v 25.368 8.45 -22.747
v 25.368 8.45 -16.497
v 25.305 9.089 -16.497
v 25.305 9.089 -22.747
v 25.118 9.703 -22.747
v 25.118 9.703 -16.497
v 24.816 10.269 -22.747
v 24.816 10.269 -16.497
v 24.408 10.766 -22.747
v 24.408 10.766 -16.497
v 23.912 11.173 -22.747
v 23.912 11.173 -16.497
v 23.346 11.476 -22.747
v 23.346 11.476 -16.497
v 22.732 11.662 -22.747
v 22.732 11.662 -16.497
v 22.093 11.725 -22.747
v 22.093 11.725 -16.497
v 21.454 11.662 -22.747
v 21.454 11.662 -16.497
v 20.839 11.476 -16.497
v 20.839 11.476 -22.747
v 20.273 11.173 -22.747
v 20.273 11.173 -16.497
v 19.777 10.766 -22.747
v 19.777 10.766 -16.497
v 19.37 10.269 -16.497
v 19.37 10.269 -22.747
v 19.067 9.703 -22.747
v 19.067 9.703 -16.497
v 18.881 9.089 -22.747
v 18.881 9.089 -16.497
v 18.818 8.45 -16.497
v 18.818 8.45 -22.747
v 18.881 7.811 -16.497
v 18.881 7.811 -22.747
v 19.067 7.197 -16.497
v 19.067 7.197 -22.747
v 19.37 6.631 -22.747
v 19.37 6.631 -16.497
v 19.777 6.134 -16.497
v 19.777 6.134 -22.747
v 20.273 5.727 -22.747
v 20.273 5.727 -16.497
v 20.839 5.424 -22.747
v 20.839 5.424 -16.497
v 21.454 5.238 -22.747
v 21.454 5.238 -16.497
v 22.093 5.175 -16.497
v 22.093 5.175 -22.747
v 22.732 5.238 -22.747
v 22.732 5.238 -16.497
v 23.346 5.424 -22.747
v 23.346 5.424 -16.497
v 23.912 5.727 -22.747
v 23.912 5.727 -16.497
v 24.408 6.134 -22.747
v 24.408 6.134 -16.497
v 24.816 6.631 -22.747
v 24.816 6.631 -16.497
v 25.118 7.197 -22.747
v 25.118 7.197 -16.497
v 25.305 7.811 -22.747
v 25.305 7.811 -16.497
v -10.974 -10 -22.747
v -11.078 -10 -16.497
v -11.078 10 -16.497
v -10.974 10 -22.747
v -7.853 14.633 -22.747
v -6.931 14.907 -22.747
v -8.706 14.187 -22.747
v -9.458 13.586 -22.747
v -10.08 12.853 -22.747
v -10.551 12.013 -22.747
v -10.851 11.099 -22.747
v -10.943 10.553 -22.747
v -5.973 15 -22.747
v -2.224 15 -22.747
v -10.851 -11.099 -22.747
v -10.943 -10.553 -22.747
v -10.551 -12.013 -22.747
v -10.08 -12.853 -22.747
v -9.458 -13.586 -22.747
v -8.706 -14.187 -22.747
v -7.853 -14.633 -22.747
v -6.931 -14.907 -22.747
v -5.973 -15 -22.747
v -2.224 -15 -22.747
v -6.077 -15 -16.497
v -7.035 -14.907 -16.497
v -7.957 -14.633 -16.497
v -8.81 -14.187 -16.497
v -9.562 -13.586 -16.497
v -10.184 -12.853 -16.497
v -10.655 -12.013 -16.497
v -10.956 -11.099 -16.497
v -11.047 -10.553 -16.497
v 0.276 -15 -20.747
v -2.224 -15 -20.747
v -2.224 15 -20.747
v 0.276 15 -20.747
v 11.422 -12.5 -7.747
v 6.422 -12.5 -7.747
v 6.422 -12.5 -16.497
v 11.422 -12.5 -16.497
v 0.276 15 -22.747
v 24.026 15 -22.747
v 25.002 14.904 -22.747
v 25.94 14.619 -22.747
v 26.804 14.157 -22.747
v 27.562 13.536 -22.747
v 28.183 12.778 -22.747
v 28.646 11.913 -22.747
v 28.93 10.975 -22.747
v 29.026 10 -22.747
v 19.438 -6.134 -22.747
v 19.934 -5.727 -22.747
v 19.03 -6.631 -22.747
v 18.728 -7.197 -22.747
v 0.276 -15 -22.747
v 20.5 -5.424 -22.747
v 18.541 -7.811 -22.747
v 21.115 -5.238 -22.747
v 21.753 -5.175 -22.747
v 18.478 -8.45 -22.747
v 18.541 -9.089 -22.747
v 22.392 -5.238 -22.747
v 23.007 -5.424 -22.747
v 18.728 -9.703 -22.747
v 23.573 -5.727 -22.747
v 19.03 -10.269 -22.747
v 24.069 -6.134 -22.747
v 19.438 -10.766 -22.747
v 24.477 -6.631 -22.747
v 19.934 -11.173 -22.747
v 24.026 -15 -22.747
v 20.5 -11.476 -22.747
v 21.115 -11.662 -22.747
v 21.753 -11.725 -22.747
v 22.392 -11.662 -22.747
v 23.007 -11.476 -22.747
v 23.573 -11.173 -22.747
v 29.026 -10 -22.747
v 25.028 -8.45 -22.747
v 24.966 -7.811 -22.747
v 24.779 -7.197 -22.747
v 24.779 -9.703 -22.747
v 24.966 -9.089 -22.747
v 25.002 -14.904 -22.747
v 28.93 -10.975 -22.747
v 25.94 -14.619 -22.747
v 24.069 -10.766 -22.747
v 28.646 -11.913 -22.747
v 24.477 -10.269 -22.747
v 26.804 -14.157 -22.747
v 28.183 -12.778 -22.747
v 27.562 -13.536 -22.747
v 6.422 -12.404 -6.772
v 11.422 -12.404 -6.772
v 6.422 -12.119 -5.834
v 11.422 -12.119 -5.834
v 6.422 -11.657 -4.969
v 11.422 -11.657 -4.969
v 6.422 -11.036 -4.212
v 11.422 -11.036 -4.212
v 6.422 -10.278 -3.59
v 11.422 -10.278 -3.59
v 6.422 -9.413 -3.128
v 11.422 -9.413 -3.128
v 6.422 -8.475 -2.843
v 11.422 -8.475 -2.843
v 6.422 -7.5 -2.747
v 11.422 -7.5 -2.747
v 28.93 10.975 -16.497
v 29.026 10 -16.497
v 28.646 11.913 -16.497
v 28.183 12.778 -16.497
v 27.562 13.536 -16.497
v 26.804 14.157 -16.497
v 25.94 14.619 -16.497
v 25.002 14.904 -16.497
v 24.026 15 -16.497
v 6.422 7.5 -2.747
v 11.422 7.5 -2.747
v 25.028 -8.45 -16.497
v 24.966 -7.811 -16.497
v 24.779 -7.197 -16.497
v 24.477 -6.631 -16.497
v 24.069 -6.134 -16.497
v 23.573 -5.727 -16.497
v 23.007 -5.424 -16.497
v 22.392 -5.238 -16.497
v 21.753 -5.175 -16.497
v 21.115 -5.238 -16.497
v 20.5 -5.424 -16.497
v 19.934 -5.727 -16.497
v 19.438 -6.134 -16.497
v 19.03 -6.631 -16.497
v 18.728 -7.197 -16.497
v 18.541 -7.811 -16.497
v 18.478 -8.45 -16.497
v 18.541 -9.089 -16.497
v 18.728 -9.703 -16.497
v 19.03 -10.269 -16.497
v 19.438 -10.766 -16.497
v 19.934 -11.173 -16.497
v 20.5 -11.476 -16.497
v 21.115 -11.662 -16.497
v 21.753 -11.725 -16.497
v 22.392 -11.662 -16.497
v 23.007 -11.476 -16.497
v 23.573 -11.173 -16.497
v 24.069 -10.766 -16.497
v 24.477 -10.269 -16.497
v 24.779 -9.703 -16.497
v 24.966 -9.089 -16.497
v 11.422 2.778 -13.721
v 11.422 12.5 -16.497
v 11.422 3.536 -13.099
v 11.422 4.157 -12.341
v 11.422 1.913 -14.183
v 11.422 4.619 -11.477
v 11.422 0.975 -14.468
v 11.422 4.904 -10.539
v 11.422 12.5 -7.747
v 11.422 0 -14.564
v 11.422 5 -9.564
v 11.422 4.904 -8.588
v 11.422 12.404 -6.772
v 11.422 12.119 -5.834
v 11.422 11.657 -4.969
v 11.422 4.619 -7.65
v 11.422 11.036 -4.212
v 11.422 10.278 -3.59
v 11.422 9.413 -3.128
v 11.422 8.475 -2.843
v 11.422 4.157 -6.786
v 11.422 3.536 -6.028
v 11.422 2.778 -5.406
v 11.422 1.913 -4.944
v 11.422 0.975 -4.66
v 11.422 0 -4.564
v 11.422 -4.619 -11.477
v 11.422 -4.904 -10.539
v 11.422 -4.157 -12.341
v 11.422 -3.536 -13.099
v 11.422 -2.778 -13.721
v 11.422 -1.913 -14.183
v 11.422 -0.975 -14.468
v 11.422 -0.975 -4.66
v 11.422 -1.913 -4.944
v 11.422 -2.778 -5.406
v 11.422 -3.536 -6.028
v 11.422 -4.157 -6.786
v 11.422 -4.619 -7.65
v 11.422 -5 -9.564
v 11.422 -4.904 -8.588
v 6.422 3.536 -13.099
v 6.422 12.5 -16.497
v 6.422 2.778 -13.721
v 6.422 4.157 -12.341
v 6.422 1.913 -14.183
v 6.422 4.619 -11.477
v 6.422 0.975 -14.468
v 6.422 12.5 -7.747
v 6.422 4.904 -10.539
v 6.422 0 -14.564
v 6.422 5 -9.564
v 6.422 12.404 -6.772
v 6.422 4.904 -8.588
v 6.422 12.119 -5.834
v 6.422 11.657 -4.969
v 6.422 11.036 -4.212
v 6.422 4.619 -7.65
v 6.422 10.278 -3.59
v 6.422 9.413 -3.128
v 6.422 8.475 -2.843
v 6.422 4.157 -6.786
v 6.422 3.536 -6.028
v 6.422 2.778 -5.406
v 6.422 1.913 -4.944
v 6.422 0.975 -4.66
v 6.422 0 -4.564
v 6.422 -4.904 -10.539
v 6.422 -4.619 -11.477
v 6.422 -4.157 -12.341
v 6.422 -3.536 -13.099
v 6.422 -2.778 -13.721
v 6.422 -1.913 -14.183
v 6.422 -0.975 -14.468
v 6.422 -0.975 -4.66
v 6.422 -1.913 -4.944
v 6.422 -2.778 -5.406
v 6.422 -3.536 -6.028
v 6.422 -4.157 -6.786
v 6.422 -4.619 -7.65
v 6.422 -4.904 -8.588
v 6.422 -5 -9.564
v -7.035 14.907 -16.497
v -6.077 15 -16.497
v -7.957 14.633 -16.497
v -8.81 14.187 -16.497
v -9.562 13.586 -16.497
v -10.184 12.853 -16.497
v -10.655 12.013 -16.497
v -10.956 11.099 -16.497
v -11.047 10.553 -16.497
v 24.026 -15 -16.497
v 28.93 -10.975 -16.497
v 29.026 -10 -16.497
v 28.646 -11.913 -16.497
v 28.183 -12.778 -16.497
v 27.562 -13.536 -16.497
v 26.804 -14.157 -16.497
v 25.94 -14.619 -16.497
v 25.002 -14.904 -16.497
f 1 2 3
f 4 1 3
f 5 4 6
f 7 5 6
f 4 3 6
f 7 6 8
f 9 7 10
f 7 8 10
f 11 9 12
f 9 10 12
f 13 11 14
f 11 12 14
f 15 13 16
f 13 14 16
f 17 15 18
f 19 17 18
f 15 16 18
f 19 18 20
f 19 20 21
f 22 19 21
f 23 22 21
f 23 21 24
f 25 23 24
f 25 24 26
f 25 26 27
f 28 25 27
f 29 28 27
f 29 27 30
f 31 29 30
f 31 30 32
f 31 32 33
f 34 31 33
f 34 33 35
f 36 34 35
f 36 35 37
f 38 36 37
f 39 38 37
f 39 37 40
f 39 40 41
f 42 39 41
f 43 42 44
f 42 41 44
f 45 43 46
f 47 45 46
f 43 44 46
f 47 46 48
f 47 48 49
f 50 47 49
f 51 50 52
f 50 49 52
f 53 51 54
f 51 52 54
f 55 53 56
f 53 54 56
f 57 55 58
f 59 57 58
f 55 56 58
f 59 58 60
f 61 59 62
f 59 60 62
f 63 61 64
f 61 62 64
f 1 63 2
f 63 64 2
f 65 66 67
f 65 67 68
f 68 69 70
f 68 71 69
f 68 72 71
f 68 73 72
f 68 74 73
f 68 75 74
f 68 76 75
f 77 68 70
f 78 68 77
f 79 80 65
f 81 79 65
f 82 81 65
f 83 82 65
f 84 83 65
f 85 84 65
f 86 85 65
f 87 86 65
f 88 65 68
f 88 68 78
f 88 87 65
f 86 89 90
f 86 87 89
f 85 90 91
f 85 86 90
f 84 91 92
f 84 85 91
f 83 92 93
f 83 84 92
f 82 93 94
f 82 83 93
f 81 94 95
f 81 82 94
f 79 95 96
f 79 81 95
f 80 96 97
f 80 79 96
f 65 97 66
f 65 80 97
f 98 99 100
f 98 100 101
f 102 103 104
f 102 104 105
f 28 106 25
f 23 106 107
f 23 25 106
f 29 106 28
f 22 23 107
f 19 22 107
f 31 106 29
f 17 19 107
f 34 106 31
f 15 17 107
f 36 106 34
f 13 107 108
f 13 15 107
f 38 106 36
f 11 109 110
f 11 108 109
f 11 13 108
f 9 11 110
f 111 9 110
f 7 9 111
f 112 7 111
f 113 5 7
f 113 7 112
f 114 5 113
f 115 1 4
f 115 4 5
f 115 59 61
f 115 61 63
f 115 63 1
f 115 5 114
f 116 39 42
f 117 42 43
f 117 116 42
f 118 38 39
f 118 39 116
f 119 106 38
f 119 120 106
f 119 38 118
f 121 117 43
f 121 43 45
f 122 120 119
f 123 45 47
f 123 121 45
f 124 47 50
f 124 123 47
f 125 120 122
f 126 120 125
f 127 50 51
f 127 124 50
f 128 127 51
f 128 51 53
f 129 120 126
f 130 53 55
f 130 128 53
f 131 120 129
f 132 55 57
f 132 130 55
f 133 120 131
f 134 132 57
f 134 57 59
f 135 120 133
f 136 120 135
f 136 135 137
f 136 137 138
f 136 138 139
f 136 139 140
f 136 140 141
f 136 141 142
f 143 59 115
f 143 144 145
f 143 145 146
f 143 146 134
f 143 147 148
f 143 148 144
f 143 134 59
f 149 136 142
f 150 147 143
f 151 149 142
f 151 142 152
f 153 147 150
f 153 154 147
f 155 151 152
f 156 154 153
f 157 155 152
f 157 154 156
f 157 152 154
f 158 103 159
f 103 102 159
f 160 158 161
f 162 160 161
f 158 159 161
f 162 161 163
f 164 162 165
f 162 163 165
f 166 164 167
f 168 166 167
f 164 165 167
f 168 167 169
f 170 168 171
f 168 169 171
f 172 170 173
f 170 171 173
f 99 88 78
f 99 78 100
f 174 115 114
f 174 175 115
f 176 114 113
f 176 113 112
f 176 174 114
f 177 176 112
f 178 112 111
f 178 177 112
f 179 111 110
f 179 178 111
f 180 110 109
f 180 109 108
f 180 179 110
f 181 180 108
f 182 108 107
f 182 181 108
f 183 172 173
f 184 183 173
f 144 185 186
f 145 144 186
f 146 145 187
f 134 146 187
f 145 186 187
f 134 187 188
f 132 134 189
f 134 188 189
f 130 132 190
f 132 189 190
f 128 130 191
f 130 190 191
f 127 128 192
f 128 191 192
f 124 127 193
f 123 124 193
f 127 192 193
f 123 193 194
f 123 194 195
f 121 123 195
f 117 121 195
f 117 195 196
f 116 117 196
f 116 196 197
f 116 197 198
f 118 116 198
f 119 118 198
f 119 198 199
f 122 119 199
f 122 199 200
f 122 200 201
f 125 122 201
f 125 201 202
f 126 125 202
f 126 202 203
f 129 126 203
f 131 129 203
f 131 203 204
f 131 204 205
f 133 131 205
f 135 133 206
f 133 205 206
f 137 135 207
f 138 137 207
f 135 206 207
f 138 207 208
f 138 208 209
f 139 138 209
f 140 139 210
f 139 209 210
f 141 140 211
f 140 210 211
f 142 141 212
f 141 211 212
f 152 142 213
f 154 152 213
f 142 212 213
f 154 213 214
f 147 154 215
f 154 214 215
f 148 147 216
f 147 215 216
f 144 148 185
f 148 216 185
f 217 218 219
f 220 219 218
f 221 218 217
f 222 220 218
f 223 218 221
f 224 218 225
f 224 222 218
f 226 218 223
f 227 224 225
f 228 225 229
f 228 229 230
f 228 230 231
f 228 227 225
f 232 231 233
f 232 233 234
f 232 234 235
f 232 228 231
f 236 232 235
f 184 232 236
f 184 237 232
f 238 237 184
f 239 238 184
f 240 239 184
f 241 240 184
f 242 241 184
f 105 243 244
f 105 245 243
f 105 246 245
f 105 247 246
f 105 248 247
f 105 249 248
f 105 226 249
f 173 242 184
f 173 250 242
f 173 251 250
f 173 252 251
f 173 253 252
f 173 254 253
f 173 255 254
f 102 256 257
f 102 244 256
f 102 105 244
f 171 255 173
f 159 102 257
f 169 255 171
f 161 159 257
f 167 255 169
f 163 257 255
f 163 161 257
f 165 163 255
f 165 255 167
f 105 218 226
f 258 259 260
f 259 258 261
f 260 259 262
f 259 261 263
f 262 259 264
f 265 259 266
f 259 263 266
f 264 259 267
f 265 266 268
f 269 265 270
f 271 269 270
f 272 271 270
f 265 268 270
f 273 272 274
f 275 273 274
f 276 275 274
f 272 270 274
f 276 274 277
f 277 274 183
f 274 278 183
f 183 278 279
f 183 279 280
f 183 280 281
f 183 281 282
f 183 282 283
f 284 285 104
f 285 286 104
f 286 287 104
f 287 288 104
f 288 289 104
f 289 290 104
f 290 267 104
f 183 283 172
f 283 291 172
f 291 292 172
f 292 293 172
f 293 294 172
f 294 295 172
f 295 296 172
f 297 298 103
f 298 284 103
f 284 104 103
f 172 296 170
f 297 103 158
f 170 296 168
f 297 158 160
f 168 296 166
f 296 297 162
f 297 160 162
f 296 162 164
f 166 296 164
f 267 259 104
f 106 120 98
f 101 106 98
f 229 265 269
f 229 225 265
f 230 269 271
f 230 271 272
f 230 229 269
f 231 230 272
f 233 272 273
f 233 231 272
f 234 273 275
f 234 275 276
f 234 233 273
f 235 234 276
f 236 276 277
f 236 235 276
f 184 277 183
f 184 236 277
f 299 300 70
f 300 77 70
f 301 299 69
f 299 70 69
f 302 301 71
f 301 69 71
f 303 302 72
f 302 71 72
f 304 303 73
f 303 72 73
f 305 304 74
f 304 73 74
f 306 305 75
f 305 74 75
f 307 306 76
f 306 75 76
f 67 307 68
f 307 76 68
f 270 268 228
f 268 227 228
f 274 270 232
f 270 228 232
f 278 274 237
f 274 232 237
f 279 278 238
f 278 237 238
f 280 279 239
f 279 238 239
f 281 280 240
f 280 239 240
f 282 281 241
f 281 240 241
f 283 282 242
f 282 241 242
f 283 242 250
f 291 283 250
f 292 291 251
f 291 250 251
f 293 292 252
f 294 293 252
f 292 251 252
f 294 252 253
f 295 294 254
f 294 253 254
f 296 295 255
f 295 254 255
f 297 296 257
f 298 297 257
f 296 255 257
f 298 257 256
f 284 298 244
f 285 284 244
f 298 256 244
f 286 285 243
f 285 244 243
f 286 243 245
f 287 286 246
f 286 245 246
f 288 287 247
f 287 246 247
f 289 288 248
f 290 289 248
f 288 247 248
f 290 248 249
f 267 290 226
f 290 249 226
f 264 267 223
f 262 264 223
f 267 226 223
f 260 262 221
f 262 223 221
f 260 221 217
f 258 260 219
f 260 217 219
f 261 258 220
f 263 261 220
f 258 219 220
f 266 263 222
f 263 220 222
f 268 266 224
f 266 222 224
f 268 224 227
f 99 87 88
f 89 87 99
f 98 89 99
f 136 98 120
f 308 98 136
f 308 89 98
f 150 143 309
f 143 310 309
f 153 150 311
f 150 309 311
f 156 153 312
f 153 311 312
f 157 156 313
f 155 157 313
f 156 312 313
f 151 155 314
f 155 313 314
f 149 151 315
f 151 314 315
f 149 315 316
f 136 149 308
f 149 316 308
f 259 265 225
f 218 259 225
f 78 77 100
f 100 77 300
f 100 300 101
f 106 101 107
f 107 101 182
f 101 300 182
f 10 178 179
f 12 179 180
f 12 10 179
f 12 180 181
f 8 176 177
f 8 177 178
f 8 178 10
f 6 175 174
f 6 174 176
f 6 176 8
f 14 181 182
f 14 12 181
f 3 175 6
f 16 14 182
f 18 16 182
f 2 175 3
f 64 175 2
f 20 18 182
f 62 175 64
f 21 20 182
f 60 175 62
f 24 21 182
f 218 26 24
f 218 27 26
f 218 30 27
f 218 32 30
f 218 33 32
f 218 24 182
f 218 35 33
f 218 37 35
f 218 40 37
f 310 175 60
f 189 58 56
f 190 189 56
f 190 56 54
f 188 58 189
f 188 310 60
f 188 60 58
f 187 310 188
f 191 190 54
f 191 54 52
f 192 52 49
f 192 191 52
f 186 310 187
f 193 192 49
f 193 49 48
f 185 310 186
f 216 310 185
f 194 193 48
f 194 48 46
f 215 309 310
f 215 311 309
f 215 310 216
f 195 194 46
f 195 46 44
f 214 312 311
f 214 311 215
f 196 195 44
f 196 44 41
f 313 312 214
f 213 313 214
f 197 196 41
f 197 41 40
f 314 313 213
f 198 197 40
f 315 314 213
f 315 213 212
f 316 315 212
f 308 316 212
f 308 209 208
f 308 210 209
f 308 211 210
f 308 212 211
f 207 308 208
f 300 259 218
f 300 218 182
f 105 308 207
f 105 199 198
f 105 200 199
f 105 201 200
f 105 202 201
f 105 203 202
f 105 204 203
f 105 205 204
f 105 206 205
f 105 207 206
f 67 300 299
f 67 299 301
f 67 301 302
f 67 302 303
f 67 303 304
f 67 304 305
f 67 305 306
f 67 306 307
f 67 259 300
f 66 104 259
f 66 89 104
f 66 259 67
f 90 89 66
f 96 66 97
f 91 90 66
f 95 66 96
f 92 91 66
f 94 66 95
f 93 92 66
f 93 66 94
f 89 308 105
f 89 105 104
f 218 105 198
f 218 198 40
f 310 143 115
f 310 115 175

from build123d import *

# Parameters (mm, degrees)
F1_DEPTH  = 15
F0_W      = 5
F0_H      = 13.750002
F2_DEPTH  = 12.5
F4_R      = 5
F5_R      = 5
F6_R      = 5
F7_R      = 3.275
F8_DEPTH  = 25
F3_W      = 2.5
F3_H      = 2
F9_DEPTH  = 50
F10_R     = 5
F11_DEPTH = 30


with BuildPart() as f1:
    # F0 (on Front) → F1 (new body, symmetric)
    with BuildSketch(Plane.XZ):
        Polygon((6.421984, -16.497303), (-11.078016, -16.497303), (-10.973849, -22.747303), (29.026151, -22.747303), (29.026151, -16.497303), (11.421984, -16.497303), align=None)
    extrude(amount=F1_DEPTH, both=True)

    # F0 (on Front) → F2 (join, symmetric)
    with BuildSketch(Plane.XZ):
        Polygon((6.421984, -16.497303), (-11.078016, -16.497303), (-10.973849, -22.747303), (29.026151, -22.747303), (29.026151, -16.497303), (11.421984, -16.497303), align=None)
        with Locations((8.921984, -9.622302)):
            Rectangle(F0_W, F0_H)
    extrude(amount=F2_DEPTH, both=True)

    # F4
    f4_edges = [f1.edges().sort_by_distance(p)[0] for p in [
        (29.026151, -15, -19.622303),
    ]]
    fillet(f4_edges, radius=F4_R)

    # F5
    f5_edges = [f1.edges().sort_by_distance(p)[0] for p in [
        (29.026151, 15, -19.622303),
        (-11.025932, -15, -19.622303),
        (-11.025932, 15, -19.622303),
    ]]
    fillet(f5_edges, radius=F5_R)

    # F6
    f6_edges = [f1.edges().sort_by_distance(p)[0] for p in [
        (8.921984, 12.5, -2.747301),
        (8.921984, -12.5, -2.747301),
    ]]
    fillet(f6_edges, radius=F6_R)

    # F7 (on Top) → F8 (cut)
    with BuildSketch(Plane.XY):
        with Locations((22.092594, 8.45)):
            Circle(F7_R)
        with Locations((21.753448, -8.45)):
            Circle(F7_R)
    extrude(amount=-F8_DEPTH, mode=Mode.SUBTRACT)

    # F3 (on Front) → F9 (cut, symmetric)
    with BuildSketch(Plane.XZ):
        with Locations((-0.973849, -21.747303)):
            Rectangle(F3_W, F3_H)
    extrude(amount=F9_DEPTH, both=True, mode=Mode.SUBTRACT)

    # F10 (on Right) → F11 (cut, symmetric)
    with BuildSketch(Plane.YZ):
        with Locations((0, -9.563591)):
            Circle(F10_R)
    extrude(amount=F11_DEPTH, both=True, mode=Mode.SUBTRACT)


solid = f1.part
